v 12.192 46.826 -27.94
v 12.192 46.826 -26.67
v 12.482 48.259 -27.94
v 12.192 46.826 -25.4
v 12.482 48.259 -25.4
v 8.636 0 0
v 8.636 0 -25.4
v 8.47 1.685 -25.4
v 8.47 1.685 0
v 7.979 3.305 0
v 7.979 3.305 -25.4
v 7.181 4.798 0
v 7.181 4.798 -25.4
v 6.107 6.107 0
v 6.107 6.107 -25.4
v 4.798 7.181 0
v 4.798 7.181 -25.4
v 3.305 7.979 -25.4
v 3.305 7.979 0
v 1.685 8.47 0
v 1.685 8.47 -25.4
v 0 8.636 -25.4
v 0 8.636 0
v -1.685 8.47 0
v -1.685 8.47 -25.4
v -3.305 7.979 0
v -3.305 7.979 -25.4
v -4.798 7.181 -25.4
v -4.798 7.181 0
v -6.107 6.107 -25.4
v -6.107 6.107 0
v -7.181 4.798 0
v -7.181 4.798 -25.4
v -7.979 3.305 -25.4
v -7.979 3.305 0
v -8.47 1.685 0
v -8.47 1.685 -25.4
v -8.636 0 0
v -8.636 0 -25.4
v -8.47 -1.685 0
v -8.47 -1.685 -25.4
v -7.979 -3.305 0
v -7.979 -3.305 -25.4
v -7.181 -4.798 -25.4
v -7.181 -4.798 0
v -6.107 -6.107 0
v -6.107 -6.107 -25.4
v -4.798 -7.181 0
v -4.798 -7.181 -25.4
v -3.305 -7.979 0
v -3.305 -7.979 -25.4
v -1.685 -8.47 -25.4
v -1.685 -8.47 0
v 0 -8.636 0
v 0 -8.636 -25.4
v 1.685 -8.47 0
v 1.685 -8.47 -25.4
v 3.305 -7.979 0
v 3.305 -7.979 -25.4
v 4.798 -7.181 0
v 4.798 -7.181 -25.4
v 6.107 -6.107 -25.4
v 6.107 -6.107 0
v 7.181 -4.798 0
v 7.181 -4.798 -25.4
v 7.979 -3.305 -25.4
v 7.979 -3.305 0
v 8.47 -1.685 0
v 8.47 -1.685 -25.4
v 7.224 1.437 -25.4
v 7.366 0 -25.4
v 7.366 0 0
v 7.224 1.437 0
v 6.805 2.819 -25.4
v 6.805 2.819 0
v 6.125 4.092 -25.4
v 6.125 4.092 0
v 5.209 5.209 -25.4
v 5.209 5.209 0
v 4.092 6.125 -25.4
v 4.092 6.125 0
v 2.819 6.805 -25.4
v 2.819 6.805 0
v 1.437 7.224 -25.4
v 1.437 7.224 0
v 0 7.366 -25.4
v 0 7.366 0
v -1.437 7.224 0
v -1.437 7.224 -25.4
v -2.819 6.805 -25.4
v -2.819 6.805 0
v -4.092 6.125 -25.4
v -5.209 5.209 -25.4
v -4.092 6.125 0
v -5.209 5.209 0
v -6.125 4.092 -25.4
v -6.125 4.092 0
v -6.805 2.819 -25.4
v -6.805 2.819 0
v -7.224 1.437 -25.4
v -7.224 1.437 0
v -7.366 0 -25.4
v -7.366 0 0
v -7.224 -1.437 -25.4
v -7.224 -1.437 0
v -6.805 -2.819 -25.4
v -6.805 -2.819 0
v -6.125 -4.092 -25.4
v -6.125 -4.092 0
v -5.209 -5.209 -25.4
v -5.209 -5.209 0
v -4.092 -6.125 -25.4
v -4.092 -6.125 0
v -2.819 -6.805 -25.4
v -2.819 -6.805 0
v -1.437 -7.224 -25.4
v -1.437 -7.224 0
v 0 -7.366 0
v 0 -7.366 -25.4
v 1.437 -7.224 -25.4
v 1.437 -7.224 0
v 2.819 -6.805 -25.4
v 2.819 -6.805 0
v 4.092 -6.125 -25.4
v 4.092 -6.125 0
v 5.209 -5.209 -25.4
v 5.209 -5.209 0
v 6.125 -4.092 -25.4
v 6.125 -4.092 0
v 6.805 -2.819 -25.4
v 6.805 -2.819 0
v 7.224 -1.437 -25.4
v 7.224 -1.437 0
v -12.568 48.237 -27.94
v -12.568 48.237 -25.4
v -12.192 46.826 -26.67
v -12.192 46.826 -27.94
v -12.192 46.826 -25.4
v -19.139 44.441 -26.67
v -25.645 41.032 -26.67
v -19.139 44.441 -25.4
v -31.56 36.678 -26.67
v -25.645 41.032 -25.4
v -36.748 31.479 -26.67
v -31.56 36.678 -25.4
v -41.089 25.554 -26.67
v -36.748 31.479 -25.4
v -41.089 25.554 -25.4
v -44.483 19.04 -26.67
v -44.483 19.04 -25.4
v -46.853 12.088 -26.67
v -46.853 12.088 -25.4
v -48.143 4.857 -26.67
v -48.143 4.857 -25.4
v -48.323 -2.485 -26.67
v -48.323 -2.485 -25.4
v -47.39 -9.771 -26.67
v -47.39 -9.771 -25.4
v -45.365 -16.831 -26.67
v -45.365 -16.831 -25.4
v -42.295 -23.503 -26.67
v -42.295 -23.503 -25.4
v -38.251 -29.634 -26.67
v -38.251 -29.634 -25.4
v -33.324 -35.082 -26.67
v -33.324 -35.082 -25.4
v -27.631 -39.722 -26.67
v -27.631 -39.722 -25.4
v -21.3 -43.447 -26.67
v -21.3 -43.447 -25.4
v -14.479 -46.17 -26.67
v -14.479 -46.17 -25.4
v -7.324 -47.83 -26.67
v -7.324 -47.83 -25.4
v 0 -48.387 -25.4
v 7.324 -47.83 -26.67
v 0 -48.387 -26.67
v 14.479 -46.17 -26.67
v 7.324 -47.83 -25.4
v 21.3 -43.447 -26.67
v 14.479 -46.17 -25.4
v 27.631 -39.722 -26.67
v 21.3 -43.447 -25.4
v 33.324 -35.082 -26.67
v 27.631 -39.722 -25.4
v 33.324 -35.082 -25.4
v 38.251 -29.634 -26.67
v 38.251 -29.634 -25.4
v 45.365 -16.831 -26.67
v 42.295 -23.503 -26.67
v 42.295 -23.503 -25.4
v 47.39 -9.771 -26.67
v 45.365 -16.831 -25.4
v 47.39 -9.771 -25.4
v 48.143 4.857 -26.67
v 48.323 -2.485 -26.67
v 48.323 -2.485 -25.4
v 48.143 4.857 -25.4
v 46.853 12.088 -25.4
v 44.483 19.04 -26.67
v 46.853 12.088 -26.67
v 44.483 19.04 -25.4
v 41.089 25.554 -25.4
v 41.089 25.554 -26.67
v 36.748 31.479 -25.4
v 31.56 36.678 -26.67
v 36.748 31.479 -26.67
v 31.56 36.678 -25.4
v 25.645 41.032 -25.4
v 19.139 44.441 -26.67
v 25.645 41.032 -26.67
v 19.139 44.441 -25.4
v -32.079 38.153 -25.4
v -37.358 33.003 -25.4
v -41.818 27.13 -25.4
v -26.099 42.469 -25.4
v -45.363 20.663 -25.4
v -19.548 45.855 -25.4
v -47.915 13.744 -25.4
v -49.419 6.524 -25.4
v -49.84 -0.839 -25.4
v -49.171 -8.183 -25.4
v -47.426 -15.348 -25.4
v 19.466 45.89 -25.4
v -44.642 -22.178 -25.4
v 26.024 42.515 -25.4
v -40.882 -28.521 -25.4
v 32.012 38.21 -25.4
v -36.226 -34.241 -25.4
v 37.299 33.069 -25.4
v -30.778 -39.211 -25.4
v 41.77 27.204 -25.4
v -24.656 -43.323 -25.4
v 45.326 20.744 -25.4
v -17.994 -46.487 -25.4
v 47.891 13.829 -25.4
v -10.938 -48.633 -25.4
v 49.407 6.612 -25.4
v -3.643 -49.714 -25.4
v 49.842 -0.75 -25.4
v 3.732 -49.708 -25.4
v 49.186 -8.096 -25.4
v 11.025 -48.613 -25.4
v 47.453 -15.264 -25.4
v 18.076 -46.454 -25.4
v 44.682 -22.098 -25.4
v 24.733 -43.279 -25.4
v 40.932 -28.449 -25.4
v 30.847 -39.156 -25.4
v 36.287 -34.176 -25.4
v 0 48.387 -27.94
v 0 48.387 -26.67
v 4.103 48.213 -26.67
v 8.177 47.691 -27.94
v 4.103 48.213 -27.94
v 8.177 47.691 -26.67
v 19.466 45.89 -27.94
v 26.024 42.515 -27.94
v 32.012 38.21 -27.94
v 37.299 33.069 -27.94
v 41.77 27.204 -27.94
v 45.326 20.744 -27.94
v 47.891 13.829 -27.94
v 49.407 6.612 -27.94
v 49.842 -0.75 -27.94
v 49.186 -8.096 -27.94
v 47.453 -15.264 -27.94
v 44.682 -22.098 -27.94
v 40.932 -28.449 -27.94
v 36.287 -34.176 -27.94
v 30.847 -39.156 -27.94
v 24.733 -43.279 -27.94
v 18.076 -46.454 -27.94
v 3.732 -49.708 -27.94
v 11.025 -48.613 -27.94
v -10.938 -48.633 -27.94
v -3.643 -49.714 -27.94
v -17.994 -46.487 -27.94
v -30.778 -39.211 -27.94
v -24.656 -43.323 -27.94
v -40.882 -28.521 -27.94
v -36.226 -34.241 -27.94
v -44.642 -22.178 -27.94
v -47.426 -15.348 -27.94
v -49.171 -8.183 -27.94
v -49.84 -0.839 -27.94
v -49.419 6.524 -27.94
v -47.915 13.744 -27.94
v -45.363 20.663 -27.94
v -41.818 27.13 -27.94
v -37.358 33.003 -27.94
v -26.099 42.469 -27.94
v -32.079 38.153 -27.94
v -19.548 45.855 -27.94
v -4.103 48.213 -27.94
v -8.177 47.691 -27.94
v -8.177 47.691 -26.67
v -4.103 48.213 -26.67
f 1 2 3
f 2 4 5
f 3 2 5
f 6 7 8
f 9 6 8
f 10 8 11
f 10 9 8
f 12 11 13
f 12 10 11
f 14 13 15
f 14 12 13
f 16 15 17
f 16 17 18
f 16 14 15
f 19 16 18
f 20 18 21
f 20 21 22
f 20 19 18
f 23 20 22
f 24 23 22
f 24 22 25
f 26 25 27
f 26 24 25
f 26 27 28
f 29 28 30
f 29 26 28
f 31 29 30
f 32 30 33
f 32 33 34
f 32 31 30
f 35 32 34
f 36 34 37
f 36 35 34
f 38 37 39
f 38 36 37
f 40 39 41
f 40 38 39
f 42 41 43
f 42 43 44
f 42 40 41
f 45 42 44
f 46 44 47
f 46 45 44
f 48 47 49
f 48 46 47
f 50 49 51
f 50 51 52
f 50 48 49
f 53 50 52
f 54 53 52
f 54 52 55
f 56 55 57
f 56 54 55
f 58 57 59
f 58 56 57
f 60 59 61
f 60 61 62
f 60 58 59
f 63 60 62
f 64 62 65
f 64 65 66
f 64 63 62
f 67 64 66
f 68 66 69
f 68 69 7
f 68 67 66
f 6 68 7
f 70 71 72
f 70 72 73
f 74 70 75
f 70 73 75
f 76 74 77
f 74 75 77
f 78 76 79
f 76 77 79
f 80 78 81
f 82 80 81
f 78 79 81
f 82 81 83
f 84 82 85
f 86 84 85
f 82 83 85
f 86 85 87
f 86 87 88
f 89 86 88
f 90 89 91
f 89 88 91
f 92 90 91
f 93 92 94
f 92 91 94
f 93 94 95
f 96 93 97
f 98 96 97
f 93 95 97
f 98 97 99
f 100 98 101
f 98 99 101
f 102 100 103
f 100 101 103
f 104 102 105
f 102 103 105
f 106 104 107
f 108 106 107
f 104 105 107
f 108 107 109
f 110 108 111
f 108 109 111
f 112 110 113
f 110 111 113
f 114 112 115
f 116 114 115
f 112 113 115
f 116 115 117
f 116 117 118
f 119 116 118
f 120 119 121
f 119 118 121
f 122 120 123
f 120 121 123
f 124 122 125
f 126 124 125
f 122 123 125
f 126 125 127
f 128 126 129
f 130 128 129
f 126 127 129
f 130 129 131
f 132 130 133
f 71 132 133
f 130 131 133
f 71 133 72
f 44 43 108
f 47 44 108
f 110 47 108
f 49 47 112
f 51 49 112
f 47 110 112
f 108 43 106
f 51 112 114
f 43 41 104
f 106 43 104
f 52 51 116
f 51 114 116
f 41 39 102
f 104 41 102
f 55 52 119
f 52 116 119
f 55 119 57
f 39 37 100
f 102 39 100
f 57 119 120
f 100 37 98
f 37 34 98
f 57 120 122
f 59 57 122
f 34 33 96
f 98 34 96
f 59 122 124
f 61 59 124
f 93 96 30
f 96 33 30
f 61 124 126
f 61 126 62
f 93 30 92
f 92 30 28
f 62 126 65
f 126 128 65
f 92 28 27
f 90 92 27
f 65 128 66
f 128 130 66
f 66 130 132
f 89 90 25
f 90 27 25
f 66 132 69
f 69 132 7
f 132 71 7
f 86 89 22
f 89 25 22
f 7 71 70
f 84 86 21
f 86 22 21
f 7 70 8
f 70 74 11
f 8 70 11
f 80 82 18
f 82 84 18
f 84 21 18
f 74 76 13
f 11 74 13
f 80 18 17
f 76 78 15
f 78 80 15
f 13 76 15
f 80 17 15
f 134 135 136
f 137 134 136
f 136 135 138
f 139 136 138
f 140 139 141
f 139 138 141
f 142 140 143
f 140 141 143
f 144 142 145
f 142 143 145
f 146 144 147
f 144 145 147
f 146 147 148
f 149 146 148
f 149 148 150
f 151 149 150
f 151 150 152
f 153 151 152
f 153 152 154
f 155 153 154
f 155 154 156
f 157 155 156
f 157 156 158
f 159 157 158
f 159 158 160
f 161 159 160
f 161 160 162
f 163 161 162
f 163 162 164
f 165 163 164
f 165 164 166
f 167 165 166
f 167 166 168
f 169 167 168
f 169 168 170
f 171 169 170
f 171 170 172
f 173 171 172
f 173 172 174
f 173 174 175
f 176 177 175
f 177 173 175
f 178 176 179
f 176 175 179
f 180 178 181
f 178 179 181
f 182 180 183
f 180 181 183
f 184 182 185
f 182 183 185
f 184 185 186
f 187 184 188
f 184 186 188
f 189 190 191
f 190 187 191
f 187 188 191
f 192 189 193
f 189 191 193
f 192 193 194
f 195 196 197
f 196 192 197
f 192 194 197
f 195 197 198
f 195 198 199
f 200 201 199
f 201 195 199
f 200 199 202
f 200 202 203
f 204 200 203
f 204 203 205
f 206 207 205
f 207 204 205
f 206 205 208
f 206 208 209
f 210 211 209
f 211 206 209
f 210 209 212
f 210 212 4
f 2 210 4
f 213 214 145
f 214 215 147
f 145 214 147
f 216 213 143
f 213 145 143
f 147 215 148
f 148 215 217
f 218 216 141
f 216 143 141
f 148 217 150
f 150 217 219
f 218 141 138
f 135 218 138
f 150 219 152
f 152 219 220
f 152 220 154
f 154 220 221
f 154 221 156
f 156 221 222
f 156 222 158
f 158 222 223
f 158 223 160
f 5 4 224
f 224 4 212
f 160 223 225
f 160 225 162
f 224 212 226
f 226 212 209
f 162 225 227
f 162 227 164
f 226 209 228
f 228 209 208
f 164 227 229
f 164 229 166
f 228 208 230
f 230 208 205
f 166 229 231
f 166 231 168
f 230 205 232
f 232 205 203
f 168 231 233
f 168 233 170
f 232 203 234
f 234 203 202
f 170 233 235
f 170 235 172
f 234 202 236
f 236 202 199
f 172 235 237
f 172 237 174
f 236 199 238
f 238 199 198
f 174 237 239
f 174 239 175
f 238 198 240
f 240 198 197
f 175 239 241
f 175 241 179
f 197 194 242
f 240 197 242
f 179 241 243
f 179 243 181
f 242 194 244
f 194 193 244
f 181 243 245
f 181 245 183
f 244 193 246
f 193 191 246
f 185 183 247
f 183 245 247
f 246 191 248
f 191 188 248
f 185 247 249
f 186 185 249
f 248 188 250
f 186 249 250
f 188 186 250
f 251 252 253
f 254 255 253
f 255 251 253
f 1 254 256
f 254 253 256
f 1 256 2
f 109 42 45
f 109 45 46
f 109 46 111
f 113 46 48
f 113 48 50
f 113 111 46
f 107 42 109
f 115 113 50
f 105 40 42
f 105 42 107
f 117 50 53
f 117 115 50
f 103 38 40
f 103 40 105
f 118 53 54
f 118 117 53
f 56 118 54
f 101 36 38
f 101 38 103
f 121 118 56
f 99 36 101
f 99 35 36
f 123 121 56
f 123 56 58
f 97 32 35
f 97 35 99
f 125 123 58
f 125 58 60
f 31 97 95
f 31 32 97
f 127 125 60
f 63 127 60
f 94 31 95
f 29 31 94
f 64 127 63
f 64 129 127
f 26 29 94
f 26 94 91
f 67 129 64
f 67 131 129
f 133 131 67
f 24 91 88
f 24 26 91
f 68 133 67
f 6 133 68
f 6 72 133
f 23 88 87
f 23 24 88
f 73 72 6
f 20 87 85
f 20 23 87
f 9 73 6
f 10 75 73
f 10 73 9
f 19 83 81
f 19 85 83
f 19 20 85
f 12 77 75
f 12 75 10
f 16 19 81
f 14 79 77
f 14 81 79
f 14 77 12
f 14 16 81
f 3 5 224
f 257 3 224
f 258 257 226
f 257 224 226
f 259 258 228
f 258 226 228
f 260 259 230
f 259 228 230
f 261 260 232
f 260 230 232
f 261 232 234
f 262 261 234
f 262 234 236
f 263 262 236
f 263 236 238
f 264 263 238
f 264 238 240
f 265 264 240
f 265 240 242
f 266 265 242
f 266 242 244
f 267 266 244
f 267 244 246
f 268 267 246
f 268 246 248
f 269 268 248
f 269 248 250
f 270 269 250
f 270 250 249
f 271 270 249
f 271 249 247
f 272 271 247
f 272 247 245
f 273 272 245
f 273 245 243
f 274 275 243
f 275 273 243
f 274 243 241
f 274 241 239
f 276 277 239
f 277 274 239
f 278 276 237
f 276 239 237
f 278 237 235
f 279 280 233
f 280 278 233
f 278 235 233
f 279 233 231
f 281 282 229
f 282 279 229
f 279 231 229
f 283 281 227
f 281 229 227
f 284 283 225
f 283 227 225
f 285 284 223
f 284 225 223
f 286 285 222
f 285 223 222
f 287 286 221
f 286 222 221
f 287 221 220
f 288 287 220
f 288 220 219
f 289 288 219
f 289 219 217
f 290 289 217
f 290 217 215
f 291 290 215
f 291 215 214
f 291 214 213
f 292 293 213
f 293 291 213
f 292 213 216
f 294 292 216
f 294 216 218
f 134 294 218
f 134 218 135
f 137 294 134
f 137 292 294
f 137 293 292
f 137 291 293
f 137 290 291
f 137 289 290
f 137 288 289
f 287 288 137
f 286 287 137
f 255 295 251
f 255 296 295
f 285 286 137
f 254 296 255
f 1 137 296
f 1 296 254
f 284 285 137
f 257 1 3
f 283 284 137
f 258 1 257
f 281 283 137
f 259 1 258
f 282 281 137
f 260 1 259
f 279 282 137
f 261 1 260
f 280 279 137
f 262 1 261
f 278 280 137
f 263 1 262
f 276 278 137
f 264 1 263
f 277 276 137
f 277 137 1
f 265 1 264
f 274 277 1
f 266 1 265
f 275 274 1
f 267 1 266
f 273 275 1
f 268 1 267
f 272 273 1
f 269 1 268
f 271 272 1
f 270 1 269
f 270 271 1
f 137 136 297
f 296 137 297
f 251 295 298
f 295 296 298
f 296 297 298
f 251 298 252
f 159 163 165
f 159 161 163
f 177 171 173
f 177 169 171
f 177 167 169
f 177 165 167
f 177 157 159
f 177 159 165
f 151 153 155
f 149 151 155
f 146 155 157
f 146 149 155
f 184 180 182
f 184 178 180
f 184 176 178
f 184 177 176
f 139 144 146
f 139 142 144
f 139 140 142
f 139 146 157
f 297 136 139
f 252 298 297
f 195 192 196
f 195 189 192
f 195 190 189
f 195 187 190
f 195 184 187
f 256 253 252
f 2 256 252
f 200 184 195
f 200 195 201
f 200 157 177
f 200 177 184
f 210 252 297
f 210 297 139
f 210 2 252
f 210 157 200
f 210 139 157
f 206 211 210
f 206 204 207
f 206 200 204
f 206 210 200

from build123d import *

# Parameters (mm, degrees)
F0_R     = 8.636
F0_R_2   = 7.366
F1_DEPTH = 25.4
F2_R     = 49.8475
F2_R_2   = 8.636
F2_R_3   = 7.366
F3_DEPTH = 2.54
F4_R     = 48.387
F5_DEPTH = 1.27
F7_DEPTH = 25.4


# Not quite as in the source:
# - a feature names something its author has since deleted; it is built from what else it names


with BuildPart() as f1:
    # F0 (on Top) → F1 (new body)
    with BuildSketch(Plane.XY):
        Circle(F0_R)
        Circle(F0_R_2, mode=Mode.SUBTRACT)
    extrude(amount=-F1_DEPTH)


with BuildPart() as f3:
    # F2 (on face) → F3 (new body)
    with BuildSketch(Plane(origin=(0, 0, -25.4), x_dir=(1, 0, 0), z_dir=(0, 0, -1))):
        Circle(F2_R)
        Circle(F2_R_2, mode=Mode.SUBTRACT)
        Circle(F2_R_2)
        Circle(F2_R_3, mode=Mode.SUBTRACT)
        Circle(F2_R_3)
    extrude(amount=F3_DEPTH)

    # F4 (on face) → F5 (cut)
    with BuildSketch(Plane.XY.offset(-25.4)):
        Circle(F4_R)
    extrude(amount=-F5_DEPTH, mode=Mode.SUBTRACT)

    # F6 (on face) → F7 (cut)
    with BuildSketch(Plane.XY.offset(-25.4)):
        with BuildLine():
            ThreePointArc((-12.192, 46.8258145151), (-6.1457742417, 47.9951167096), (0, 48.387))
            ThreePointArc((0, 48.387), (6.1457742417, 47.9951167096), (12.192, 46.8258145151))
            Line((12.192, 46.8258145151), (12.4823854572, 48.2593339112))
            ThreePointArc((12.4823854572, 48.2593339112), (-0.0443521709, 49.8474802687), (-12.5682438369, 48.2370449251))
            Line((-12.5682438369, 48.2370449251), (-12.192, 46.8258145151))
        make_face()
    extrude(amount=-F7_DEPTH, mode=Mode.SUBTRACT)


solid = Compound([f1.part, f3.part])
